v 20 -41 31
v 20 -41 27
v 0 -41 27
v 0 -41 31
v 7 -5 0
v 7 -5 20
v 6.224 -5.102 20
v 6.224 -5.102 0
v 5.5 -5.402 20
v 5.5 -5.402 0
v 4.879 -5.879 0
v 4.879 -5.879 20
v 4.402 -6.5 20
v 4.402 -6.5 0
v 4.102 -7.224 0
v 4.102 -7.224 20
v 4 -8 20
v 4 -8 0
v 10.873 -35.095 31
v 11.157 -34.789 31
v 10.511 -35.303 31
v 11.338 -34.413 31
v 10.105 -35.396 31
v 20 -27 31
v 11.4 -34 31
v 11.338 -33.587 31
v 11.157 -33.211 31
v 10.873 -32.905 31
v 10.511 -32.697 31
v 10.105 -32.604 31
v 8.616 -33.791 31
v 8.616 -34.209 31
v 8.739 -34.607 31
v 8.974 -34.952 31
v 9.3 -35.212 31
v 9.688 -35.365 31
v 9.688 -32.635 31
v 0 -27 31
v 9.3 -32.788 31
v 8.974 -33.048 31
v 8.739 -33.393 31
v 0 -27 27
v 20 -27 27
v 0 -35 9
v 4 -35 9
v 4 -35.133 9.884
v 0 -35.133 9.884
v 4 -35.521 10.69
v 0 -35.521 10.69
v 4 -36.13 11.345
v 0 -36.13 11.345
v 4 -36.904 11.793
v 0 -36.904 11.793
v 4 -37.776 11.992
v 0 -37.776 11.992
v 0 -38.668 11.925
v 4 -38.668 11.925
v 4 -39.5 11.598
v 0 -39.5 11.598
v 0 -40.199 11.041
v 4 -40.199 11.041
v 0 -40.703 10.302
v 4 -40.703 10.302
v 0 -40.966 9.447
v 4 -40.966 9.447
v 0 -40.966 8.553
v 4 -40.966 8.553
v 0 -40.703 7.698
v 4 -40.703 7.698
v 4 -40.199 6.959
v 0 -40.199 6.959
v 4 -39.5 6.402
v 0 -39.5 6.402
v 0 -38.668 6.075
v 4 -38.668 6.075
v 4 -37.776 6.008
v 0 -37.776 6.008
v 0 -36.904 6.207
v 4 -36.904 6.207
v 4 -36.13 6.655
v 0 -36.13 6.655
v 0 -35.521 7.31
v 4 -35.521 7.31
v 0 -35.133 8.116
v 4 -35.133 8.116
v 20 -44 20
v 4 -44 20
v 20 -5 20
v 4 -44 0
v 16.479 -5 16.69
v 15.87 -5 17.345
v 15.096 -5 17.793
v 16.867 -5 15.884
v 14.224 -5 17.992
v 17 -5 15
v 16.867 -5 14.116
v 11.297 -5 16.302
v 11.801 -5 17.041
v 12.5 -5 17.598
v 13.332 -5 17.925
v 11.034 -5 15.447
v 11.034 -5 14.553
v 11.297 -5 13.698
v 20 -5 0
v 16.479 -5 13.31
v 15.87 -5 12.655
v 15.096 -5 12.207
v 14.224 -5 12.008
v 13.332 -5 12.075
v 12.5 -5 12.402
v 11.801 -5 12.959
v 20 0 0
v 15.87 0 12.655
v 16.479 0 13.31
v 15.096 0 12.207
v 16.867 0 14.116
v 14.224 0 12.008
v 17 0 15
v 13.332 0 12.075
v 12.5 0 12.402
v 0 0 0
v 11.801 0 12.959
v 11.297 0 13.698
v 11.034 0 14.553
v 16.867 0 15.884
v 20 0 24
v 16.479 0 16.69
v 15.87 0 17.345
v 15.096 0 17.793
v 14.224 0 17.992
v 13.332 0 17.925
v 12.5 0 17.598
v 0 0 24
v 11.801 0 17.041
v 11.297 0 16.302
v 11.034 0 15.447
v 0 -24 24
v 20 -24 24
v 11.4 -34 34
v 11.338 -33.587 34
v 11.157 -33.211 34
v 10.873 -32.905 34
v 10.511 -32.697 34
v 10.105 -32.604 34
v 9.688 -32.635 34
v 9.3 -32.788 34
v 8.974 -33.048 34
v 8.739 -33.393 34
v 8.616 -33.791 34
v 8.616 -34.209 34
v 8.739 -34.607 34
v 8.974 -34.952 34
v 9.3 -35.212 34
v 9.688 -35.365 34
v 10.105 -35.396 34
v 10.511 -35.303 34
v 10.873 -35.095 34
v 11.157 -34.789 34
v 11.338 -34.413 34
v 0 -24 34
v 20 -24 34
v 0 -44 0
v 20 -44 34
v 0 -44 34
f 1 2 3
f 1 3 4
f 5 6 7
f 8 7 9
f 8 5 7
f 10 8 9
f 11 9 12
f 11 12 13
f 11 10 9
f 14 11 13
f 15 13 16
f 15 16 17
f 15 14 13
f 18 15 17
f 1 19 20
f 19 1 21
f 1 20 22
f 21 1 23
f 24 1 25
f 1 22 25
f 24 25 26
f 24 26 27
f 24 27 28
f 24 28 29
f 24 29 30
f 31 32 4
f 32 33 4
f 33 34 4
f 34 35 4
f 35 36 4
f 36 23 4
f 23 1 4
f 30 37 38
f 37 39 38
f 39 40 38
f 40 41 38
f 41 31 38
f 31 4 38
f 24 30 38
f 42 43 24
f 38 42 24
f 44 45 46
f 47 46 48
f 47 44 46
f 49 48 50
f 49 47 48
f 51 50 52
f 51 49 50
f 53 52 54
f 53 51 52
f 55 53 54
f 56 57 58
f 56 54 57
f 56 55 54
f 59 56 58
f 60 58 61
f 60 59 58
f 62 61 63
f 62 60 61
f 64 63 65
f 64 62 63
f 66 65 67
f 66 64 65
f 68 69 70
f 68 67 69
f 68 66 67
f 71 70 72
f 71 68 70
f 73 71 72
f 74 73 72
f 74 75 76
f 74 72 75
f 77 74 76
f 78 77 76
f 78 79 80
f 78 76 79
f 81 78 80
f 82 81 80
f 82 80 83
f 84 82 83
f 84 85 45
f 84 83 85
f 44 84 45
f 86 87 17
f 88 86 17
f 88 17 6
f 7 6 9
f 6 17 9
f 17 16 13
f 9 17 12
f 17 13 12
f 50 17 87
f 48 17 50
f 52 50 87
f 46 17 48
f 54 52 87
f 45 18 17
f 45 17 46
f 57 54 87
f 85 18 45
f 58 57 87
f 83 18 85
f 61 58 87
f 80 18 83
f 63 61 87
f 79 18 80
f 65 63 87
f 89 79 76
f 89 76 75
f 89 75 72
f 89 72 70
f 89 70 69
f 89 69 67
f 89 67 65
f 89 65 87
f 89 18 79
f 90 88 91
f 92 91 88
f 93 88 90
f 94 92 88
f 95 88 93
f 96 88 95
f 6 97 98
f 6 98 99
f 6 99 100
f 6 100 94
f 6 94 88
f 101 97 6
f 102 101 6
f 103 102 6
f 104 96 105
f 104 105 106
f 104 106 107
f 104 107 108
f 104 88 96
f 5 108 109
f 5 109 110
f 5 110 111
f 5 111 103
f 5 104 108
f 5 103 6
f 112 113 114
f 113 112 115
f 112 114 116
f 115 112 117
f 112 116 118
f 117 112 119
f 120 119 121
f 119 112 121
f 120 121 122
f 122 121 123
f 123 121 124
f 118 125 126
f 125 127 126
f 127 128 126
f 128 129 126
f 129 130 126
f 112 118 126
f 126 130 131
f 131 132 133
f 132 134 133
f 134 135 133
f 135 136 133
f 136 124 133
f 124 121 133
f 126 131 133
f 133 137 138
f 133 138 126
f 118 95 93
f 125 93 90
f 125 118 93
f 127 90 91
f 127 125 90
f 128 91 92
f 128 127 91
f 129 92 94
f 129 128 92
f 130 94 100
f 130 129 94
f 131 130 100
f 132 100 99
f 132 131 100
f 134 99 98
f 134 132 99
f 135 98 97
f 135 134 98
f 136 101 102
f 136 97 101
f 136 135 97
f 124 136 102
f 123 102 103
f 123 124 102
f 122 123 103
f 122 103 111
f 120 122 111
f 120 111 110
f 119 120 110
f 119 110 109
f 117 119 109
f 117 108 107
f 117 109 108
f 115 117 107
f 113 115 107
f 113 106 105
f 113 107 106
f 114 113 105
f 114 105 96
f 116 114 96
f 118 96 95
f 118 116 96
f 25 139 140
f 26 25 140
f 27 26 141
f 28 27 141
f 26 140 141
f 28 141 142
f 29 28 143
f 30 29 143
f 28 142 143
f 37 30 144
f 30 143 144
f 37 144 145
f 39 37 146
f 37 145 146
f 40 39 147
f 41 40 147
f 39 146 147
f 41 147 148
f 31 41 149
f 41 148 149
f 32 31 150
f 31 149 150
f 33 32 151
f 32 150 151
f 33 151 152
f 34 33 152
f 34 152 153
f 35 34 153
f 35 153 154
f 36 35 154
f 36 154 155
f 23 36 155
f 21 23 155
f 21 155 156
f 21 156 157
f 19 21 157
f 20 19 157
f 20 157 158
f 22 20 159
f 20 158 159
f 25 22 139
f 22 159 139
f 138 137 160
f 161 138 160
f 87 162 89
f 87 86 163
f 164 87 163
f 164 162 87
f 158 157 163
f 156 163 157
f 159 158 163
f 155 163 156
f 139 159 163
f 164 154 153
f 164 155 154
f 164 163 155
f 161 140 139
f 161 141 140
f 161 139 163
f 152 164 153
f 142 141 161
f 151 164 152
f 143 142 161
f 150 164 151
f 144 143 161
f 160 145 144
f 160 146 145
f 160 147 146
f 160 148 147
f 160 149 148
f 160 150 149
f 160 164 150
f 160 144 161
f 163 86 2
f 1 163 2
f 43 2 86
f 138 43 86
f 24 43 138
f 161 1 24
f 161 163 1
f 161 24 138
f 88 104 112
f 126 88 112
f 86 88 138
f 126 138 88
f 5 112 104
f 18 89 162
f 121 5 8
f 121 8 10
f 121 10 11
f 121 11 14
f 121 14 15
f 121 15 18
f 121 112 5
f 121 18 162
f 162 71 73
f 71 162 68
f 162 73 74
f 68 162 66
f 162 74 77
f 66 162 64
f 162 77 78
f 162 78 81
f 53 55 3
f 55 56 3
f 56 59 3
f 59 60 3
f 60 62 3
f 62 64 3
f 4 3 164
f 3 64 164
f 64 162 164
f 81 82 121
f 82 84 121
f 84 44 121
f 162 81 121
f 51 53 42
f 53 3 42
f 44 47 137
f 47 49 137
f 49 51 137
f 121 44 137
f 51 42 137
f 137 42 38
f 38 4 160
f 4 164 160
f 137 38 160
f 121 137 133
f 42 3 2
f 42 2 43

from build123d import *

# Parameters (mm, degrees)
PAD009_DEPTH    = 20
SKETCH023_R     = 3
POCKET008_DEPTH = 44.001
SKETCH024_R     = 3
POCKET009_DEPTH = 5
SKETCH026_W     = 44
SKETCH026_H     = 4
PAD011_DEPTH    = 20
SKETCH027_W     = 20
SKETCH027_H     = 10
SKETCH027_W_2   = 14
SKETCH027_H_2   = 4
PAD012_DEPTH    = 20
SKETCH028_R     = 1.4
POCKET010_DEPTH = 3


with BuildPart() as part:
    # Sketch021 → Pad009 (new body)
    with BuildSketch(Plane.XY):
        with BuildLine():
            Line((0, -44), (0, 0))
            Line((0, 0), (20, 0))
            Line((20, 0), (20, -5))
            Line((20, -5), (7, -5))
            ThreePointArc((7, -5), (4.87868, -5.87868), (4, -8))
            Line((4, -8), (4, -44))
            Line((4, -44), (0, -44))
        make_face()
    extrude(amount=PAD009_DEPTH)

    # Sketch023 → Pocket008 (cut, through all)
    with BuildSketch(Plane.XZ):
        with Locations((14, 15)):
            Circle(SKETCH023_R)
    extrude(amount=POCKET008_DEPTH, mode=Mode.SUBTRACT)

    # Sketch024 → Pocket009 (cut)
    with BuildSketch(Plane.YZ):
        with Locations((-38, 9)):
            Circle(SKETCH024_R)
    extrude(amount=POCKET009_DEPTH, mode=Mode.SUBTRACT)

    # Sketch026 → Pad011 (join)
    with BuildSketch(Plane.YZ):
        with Locations((-22, 22)):
            Rectangle(SKETCH026_W, SKETCH026_H)
    extrude(amount=PAD011_DEPTH)

    # Sketch027 → Pad012 (join)
    with BuildSketch(Plane.YZ):
        with Locations((-34, 29)):
            Rectangle(SKETCH027_W, SKETCH027_H)
        with Locations((-34, 29)):
            Rectangle(SKETCH027_W_2, SKETCH027_H_2, mode=Mode.SUBTRACT)
    extrude(amount=PAD012_DEPTH)

    # Sketch028 → Pocket010 (cut)
    with BuildSketch(Plane.XY.offset(34)):
        with Locations((10, -34)):
            Circle(SKETCH028_R)
    extrude(amount=-POCKET010_DEPTH, mode=Mode.SUBTRACT)


solid = part.part
